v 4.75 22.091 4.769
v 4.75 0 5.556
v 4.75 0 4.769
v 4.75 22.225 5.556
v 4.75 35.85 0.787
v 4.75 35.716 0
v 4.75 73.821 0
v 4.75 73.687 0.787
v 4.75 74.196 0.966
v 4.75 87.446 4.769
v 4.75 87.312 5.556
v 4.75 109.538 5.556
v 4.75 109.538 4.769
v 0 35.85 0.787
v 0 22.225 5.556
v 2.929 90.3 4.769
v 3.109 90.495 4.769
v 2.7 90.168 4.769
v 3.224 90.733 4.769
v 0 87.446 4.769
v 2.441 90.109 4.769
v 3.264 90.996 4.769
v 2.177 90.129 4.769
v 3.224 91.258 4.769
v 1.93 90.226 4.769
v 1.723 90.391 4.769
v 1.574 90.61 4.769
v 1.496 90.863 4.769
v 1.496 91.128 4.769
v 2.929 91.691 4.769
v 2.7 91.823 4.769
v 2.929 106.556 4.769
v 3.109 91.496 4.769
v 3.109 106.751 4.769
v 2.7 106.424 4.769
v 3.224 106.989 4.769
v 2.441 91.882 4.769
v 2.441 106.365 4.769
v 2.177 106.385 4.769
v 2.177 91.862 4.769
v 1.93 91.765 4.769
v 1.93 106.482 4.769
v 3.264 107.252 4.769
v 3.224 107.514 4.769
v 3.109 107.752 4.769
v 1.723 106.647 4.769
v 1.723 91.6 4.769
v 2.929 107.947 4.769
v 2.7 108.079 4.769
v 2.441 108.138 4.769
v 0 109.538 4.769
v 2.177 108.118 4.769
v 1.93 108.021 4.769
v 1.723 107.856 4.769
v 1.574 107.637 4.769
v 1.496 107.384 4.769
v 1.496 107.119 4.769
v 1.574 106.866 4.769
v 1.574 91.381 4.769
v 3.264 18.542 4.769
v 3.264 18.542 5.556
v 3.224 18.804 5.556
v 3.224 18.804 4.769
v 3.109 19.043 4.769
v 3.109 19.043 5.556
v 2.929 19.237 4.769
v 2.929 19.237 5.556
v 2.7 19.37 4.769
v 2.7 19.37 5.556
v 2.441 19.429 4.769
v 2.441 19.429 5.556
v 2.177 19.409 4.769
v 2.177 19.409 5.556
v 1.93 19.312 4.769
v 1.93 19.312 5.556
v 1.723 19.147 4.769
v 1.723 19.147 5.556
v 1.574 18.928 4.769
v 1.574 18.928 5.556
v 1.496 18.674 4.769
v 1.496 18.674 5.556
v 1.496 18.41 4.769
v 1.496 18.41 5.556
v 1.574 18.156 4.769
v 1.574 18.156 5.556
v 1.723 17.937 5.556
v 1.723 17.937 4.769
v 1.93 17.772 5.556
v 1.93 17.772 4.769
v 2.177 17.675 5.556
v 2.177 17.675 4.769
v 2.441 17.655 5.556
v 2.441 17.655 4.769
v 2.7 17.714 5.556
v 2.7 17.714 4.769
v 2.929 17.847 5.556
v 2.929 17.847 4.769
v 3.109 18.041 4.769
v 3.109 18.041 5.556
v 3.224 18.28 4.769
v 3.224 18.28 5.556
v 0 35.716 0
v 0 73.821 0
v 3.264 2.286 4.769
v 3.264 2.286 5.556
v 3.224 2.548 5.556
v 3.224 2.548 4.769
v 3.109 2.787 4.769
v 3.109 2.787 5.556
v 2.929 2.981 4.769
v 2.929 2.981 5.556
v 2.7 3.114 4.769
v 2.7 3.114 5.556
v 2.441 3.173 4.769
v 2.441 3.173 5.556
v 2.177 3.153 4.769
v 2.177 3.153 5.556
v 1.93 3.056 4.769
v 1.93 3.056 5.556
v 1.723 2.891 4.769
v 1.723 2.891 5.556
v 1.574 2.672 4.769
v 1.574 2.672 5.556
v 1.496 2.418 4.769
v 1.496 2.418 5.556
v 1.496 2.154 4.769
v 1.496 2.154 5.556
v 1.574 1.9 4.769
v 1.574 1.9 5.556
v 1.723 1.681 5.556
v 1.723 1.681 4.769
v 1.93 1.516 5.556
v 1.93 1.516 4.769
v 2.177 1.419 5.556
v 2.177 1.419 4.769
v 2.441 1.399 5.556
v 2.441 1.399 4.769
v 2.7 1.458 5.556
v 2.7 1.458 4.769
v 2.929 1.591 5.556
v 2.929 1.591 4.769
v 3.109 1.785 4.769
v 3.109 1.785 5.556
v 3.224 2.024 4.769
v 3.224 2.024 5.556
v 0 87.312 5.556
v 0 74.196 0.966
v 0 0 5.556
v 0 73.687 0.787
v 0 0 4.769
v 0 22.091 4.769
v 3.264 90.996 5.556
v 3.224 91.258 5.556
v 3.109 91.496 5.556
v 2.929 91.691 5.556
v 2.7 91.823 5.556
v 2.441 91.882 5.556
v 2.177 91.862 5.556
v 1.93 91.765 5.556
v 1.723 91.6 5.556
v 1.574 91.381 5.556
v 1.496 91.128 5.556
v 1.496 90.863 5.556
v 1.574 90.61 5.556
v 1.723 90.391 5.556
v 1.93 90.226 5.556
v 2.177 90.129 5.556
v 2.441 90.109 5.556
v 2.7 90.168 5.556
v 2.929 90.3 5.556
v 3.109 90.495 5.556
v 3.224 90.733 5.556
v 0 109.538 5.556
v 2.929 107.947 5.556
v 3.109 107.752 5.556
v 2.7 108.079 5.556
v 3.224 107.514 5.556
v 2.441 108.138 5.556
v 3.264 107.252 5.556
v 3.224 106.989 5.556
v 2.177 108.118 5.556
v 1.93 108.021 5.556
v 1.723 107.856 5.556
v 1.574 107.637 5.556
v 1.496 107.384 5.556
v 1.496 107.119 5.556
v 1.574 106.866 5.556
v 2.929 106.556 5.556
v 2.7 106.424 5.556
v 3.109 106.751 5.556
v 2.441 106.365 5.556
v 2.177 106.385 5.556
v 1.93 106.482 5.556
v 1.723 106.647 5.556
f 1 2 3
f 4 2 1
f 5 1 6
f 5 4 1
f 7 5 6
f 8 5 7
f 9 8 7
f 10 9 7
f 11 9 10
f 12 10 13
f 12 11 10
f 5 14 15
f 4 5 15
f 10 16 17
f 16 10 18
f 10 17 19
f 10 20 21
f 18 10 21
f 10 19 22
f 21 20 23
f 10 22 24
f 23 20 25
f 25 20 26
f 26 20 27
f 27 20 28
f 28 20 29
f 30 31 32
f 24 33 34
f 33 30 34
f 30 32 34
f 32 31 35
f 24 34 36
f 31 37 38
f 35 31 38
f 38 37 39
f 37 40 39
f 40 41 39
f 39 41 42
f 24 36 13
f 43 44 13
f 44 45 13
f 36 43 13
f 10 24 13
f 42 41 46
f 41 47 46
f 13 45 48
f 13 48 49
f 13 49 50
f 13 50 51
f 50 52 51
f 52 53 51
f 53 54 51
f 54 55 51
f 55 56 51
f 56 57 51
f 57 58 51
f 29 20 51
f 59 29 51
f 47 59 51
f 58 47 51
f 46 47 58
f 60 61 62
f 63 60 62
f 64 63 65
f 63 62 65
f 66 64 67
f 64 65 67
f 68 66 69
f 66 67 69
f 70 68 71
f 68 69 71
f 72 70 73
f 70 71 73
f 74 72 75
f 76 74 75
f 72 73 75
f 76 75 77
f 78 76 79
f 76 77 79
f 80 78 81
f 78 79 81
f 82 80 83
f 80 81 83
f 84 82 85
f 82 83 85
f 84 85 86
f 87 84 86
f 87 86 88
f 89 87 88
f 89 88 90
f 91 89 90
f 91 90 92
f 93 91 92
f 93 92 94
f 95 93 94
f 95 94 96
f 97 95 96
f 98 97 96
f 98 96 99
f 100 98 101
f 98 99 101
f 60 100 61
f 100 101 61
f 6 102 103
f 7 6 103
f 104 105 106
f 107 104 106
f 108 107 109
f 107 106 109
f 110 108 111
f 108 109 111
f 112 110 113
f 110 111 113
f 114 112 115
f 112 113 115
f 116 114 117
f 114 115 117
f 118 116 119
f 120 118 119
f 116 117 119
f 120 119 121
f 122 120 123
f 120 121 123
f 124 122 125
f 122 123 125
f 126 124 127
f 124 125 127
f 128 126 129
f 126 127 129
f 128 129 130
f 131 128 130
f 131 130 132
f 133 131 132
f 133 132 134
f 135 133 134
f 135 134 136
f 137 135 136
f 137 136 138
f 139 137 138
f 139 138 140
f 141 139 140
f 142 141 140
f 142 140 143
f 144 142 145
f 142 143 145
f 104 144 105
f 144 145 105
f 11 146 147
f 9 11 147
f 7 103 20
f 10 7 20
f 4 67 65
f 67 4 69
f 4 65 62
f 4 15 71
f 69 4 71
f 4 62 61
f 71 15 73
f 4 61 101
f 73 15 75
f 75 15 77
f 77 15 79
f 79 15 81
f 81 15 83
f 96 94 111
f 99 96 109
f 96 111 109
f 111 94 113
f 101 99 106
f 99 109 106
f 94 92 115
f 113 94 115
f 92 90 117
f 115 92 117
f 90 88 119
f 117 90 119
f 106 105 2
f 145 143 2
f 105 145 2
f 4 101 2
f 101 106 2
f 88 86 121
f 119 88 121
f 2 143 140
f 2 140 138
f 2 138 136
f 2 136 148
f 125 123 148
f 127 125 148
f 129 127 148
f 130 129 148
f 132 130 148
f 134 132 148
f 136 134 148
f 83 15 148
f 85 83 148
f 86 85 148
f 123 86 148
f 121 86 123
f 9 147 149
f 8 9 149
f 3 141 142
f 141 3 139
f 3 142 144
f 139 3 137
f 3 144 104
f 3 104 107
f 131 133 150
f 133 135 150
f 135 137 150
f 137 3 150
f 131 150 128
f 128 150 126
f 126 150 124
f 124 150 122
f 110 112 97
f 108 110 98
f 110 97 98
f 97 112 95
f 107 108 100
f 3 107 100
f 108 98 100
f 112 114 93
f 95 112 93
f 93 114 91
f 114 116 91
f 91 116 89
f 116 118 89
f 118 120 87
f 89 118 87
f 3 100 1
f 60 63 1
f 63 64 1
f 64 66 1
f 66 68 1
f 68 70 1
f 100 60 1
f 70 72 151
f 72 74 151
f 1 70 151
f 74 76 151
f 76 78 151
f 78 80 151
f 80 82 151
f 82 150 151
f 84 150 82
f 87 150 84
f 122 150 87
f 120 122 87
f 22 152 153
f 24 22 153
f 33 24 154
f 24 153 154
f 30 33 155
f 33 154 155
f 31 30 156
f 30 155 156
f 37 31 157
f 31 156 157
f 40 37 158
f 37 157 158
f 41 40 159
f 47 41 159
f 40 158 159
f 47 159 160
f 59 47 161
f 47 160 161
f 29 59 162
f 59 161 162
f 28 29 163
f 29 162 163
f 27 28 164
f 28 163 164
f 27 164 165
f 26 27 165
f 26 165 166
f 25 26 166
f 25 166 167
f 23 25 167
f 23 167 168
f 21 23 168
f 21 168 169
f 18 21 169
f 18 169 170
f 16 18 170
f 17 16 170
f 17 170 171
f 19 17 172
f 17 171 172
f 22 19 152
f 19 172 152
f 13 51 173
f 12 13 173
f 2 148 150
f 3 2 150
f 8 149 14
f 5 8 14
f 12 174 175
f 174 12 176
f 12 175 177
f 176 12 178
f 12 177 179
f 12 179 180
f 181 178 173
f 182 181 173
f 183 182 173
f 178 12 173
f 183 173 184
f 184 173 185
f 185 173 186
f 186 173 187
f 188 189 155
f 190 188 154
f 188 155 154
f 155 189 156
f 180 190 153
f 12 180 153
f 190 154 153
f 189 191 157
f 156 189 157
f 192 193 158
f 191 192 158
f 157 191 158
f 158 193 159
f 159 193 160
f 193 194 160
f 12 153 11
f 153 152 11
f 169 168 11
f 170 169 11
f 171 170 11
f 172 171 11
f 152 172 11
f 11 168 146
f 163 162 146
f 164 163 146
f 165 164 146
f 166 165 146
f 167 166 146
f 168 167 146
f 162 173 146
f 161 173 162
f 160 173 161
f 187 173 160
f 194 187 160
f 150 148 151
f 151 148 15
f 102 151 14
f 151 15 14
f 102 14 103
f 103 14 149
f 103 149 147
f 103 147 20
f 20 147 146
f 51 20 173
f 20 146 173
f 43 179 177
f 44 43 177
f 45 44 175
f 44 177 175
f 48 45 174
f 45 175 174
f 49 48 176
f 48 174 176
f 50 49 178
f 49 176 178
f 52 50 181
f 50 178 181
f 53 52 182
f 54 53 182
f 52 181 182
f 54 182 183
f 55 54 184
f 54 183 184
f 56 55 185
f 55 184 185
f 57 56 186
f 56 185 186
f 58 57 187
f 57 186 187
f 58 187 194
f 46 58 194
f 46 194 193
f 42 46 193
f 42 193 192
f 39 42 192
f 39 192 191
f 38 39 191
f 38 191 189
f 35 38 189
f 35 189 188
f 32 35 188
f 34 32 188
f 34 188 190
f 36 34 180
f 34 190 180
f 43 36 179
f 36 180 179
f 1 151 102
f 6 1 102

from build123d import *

# Parameters (mm, degrees)
F1_DEPTH      = 4.7498
F2_R          = 0.889
F3_DEPTH      = 0.7874
F3_DEPTH_BACK = 25.4


with BuildPart() as f1:
    # F0 (on Right) → F1 (new body)
    with BuildSketch(Plane.YZ):
        Polygon((22.091185, 4.76885), (35.71647, 0), (73.82103, 0), (87.446315, 4.76885), (109.5375, 4.76885), (109.5375, 5.55625), (87.3125, 5.55625), (74.196499, 0.96565), (73.687214, 0.7874), (73.147637, 0.7874), (35.850286, 0.7874), (22.225, 5.55625), (0, 5.55625), (0, 4.76885), align=None)
    extrude(amount=F1_DEPTH)

    # F2 (on face) → F3 (cut, two sides)
    with BuildSketch(Plane.XY.offset(5.55625)) as f3_sk:
        with Locations((2.3749, 2.286)):
            Circle(F2_R)
        with Locations((2.3749, 107.2515)):
            Circle(F2_R)
        with Locations((2.3749, 90.9955)):
            Circle(F2_R)
        with Locations((2.3749, 18.542)):
            Circle(F2_R)
    extrude(amount=-F3_DEPTH, mode=Mode.SUBTRACT)
    extrude(f3_sk.sketch, amount=-F3_DEPTH_BACK, mode=Mode.SUBTRACT)


solid = f1.part
